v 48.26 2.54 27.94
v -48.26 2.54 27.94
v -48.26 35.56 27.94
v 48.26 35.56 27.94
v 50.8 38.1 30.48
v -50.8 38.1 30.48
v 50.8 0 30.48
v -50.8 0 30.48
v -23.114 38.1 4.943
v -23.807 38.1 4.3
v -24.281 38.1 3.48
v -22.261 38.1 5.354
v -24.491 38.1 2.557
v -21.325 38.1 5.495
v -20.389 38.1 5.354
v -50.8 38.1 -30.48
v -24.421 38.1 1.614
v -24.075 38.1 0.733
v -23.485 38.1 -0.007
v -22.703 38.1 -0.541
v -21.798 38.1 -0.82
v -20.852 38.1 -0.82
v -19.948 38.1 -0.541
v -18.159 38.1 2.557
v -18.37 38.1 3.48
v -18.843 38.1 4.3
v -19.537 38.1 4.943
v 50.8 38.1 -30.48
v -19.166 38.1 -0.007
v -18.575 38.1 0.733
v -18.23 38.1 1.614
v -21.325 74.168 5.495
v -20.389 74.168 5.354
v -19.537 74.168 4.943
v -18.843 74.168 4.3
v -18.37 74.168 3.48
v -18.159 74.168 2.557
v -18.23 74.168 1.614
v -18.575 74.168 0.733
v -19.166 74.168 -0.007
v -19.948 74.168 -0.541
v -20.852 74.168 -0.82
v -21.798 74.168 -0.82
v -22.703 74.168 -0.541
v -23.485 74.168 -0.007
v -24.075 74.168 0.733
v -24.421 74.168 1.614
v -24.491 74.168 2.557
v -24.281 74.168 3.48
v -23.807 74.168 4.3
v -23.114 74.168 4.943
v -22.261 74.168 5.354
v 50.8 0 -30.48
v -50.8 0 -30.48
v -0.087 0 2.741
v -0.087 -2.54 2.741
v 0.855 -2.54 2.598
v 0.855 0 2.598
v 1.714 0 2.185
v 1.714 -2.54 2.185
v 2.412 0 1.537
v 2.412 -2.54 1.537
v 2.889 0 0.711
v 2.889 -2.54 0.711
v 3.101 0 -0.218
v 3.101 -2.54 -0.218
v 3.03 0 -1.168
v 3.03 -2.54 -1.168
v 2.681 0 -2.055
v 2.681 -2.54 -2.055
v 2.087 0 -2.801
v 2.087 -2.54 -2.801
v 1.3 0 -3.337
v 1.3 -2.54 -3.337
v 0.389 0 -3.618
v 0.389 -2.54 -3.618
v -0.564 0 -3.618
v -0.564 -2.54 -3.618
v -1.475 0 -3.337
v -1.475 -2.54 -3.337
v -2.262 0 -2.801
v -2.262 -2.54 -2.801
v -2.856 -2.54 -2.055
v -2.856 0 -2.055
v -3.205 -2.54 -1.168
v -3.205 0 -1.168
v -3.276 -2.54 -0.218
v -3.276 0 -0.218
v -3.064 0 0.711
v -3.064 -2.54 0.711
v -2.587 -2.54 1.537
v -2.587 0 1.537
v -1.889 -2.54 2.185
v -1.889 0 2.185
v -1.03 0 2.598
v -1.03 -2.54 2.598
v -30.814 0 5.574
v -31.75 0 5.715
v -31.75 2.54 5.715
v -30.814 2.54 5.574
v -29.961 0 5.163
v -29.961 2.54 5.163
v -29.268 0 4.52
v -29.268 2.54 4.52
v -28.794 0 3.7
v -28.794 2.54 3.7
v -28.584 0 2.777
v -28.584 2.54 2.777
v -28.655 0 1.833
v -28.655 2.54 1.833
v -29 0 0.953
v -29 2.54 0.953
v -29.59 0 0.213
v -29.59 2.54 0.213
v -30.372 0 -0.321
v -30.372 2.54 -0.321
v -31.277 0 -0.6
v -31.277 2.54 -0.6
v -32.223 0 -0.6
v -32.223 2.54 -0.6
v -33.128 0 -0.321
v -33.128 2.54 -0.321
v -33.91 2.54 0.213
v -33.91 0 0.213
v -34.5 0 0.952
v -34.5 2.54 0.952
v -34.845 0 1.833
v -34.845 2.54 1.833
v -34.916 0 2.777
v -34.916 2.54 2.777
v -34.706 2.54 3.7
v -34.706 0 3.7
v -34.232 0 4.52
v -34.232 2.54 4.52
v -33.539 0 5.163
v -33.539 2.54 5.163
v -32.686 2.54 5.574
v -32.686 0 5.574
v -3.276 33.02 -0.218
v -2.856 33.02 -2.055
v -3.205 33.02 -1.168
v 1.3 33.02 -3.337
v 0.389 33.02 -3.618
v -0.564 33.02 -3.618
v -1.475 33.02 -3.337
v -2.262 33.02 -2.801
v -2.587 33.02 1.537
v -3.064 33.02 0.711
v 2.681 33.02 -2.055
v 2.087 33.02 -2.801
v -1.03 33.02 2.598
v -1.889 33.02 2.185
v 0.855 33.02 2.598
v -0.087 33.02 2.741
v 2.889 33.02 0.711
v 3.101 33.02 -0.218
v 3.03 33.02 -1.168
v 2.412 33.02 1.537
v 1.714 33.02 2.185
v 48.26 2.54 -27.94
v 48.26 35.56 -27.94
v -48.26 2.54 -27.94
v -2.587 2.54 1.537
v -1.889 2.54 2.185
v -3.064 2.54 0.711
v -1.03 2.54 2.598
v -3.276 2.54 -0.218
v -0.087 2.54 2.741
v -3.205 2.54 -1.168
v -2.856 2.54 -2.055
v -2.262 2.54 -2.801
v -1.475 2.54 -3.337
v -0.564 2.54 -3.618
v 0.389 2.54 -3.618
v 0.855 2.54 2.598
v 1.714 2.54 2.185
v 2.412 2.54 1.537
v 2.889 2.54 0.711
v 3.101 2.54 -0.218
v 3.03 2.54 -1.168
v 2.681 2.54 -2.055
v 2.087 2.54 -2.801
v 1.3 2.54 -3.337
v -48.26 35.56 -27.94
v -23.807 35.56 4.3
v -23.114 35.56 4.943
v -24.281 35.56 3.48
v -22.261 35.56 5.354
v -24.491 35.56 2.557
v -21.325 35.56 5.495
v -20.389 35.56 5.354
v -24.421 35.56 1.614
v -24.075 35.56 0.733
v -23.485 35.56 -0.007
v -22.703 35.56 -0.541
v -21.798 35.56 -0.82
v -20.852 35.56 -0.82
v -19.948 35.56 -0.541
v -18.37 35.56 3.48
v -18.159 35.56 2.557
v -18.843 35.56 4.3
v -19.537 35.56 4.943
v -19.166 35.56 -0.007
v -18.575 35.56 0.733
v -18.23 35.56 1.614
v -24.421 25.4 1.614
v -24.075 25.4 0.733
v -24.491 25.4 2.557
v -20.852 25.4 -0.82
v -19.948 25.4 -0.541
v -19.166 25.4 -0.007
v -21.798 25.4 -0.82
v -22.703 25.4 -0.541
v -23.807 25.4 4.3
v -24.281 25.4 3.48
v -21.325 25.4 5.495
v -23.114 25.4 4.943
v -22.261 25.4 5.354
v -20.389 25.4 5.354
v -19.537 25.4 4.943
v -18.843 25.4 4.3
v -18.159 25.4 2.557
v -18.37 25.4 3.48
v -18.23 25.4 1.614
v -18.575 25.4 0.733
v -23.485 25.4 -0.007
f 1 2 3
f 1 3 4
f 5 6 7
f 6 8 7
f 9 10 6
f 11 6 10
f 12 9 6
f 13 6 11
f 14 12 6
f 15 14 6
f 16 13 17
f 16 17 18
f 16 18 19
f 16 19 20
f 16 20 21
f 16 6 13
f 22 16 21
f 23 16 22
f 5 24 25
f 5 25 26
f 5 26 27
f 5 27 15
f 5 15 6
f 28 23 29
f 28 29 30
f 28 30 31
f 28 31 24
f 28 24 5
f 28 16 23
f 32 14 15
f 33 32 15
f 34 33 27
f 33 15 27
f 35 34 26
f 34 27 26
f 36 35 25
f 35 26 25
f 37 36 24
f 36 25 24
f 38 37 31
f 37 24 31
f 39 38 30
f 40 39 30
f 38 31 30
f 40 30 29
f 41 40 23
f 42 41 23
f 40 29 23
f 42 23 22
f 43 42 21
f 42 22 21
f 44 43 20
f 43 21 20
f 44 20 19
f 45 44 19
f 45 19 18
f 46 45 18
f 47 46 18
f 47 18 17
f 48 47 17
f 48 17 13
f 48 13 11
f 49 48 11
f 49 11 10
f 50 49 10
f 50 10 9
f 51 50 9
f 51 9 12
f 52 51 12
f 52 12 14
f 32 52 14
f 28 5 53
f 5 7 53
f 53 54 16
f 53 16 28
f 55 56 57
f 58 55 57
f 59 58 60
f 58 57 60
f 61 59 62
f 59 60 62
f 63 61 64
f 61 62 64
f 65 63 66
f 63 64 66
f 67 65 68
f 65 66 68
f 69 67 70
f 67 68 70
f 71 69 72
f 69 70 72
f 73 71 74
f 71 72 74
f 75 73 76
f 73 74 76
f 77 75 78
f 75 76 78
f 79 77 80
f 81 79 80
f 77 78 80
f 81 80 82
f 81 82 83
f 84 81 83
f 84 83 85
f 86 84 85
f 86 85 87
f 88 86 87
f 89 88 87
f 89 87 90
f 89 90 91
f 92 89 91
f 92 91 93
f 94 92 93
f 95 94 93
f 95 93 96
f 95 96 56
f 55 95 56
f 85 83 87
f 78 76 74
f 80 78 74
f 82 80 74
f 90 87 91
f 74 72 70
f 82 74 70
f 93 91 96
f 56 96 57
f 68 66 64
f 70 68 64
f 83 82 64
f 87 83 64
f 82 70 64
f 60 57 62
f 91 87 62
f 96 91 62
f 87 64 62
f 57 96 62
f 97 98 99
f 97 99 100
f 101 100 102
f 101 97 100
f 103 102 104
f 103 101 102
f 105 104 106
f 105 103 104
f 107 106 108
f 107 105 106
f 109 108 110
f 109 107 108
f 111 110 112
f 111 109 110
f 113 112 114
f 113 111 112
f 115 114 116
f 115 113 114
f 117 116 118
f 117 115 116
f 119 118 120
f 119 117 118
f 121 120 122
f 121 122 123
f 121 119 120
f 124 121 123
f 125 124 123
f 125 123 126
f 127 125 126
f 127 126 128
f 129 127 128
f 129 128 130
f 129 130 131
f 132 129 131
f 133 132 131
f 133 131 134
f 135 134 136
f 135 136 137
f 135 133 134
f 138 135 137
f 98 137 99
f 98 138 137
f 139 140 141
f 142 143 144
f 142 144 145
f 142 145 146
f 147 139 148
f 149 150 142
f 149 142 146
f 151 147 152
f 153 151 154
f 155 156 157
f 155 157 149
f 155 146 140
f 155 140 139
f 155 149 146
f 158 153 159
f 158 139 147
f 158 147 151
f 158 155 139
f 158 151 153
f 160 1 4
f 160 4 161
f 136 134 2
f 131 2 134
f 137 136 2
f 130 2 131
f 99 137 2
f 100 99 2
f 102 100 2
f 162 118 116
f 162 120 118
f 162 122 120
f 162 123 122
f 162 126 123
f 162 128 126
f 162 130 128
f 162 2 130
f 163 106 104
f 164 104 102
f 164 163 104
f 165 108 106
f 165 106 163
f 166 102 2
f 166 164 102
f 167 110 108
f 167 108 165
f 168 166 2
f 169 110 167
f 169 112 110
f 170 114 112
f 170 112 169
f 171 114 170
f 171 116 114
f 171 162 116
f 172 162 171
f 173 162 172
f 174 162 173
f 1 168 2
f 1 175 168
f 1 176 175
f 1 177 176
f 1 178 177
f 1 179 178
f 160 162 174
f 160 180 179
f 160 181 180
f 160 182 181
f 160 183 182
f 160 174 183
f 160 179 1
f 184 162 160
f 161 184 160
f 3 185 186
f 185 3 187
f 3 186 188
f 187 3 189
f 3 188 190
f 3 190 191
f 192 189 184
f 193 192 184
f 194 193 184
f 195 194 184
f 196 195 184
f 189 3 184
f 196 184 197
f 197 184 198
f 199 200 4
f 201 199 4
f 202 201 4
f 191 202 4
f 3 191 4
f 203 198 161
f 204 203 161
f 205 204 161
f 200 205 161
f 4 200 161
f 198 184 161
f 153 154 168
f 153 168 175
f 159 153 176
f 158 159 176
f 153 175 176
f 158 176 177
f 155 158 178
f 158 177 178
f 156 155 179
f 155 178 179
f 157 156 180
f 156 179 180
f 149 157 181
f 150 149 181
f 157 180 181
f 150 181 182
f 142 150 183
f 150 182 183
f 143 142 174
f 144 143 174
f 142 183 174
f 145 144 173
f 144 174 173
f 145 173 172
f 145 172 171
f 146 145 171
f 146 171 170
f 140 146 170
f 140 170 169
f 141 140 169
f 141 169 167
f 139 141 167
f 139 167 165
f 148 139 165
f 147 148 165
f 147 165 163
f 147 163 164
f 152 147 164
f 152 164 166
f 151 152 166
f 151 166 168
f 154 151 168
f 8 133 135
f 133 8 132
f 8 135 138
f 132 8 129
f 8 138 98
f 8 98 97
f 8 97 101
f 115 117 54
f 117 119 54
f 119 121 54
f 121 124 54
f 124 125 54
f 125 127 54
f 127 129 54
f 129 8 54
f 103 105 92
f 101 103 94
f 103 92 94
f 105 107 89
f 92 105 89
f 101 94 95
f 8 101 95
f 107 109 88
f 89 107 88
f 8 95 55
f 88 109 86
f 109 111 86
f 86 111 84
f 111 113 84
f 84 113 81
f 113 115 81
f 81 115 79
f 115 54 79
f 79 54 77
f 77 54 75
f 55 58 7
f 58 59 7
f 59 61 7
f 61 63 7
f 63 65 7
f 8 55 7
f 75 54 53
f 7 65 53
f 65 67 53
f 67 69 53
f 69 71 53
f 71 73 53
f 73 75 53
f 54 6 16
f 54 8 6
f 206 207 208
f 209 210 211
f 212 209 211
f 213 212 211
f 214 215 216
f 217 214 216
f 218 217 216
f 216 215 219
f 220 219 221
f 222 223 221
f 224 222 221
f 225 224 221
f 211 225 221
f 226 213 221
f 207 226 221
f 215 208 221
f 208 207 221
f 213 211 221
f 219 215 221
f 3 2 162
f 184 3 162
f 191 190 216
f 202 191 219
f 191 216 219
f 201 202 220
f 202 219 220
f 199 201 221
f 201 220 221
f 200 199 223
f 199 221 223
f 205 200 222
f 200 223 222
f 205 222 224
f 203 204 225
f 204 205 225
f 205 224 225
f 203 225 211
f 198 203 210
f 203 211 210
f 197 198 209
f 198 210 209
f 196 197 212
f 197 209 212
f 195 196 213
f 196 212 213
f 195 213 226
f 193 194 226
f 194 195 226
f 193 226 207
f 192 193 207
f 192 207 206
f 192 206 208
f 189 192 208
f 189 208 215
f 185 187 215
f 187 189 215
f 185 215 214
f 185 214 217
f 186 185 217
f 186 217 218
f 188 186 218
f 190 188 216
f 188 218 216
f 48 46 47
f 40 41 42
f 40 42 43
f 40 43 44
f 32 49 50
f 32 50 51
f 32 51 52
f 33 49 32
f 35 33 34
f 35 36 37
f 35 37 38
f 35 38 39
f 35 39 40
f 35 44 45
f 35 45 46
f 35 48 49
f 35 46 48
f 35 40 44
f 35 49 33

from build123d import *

# Parameters (mm, degrees)
SKETCH1_W                 = 101.6
SKETCH1_H                 = 60.96
SKETCH1_R                 = 3.175
BOSS_EXTRUDE1_DEPTH       = 2.54
SKETCH2_R                 = 3.197303881
CUT_EXTRUDE1_DEPTH        = 2.54
BOSS_EXTRUDE2_DEPTH       = 30.48
BOSS_EXTRUDE2_DEPTH_BACK  = 5.08
SKETCH3_R                 = 3.197303881
SKETCH6_W                 = 2.54
SKETCH6_H                 = 60.96
BOSS_EXTRUDE10_DEPTH      = 33.02
SKETCH7_W                 = 96.52
SKETCH7_H                 = 2.54
BOSS_EXTRUDE11_DEPTH      = 33.02
SKETCH9_W                 = 101.6
SKETCH9_H                 = 60.96
BOSS_EXTRUDE12_DEPTH      = 2.54
BOSS_EXTRUDE13_DEPTH      = 36.068
BOSS_EXTRUDE13_DEPTH_BACK = 12.7
SKETCH10_R                = 3.175


with BuildPart() as part:
    # Sketch1 → Boss-Extrude1 (new body)
    with BuildSketch(Plane(origin=(0, 0, 0), x_dir=(1, 0, 0), z_dir=(0, 1, 0))):
        Rectangle(SKETCH1_W, SKETCH1_H)
        with Locations(Location((-31.75, -2.54, 0), (0, 0, 270))):
            Circle(SKETCH1_R, mode=Mode.SUBTRACT)
    extrude(amount=BOSS_EXTRUDE1_DEPTH)

    # Sketch2 → Cut-Extrude1 (cut)
    with BuildSketch(Plane(origin=(0, 2.54, 0), x_dir=(1, 0, 0), z_dir=(0, 1, 0))):
        with Locations(Location((-0.087463015, 0.456757565, 0), (0, 0, 270))):
            Circle(SKETCH2_R)
    extrude(amount=-CUT_EXTRUDE1_DEPTH, mode=Mode.SUBTRACT)

    # Sketch3 → Boss-Extrude2 (add, two sides: drawn at the far end of the back side and taken through both)
    with BuildSketch(Plane(origin=(0, 2.54, 0), x_dir=(1, 0, 0), z_dir=(0, 1, 0)).offset(-BOSS_EXTRUDE2_DEPTH_BACK)):
        with Locations(Location((-0.087463015, 0.456757565, 0), (0, 0, 270))):
            Circle(SKETCH3_R)
    extrude(amount=BOSS_EXTRUDE2_DEPTH + BOSS_EXTRUDE2_DEPTH_BACK)

    # Sketch6 → Boss-Extrude10 (add)
    with BuildSketch(Plane(origin=(0, 2.54, 0), x_dir=(1, 0, 0), z_dir=(0, 1, 0))):
        with Locations((-49.53, 0)):
            Rectangle(SKETCH6_W, SKETCH6_H)
        with Locations((49.53, 0)):
            Rectangle(SKETCH6_W, SKETCH6_H)
    extrude(amount=BOSS_EXTRUDE10_DEPTH)

    # Sketch7 → Boss-Extrude11 (add)
    with BuildSketch(Plane(origin=(0, 2.54, 0), x_dir=(1, 0, 0), z_dir=(0, 1, 0))):
        with Locations((0, 29.21)):
            Rectangle(SKETCH7_W, SKETCH7_H)
        with Locations((0, -29.21)):
            Rectangle(SKETCH7_W, SKETCH7_H)
    extrude(amount=BOSS_EXTRUDE11_DEPTH)

    # Sketch9 → Boss-Extrude12 (add)
    with BuildSketch(Plane(origin=(0, 35.56, 0), x_dir=(1, 0, 0), z_dir=(0, 1, 0))):
        Rectangle(SKETCH9_W, SKETCH9_H)
    extrude(amount=BOSS_EXTRUDE12_DEPTH)

    # Sketch10 → Boss-Extrude13 (add, two sides: drawn at the far end of the back side and taken through both)
    with BuildSketch(Plane(origin=(0, 38.1, 0), x_dir=(1, 0, 0), z_dir=(0, 1, 0)).offset(-BOSS_EXTRUDE13_DEPTH_BACK)):
        with Locations(Location((-21.325114791, -2.320034183, 0), (0, 0, 270))):
            Circle(SKETCH10_R)
    extrude(amount=BOSS_EXTRUDE13_DEPTH + BOSS_EXTRUDE13_DEPTH_BACK)


solid = part.part
